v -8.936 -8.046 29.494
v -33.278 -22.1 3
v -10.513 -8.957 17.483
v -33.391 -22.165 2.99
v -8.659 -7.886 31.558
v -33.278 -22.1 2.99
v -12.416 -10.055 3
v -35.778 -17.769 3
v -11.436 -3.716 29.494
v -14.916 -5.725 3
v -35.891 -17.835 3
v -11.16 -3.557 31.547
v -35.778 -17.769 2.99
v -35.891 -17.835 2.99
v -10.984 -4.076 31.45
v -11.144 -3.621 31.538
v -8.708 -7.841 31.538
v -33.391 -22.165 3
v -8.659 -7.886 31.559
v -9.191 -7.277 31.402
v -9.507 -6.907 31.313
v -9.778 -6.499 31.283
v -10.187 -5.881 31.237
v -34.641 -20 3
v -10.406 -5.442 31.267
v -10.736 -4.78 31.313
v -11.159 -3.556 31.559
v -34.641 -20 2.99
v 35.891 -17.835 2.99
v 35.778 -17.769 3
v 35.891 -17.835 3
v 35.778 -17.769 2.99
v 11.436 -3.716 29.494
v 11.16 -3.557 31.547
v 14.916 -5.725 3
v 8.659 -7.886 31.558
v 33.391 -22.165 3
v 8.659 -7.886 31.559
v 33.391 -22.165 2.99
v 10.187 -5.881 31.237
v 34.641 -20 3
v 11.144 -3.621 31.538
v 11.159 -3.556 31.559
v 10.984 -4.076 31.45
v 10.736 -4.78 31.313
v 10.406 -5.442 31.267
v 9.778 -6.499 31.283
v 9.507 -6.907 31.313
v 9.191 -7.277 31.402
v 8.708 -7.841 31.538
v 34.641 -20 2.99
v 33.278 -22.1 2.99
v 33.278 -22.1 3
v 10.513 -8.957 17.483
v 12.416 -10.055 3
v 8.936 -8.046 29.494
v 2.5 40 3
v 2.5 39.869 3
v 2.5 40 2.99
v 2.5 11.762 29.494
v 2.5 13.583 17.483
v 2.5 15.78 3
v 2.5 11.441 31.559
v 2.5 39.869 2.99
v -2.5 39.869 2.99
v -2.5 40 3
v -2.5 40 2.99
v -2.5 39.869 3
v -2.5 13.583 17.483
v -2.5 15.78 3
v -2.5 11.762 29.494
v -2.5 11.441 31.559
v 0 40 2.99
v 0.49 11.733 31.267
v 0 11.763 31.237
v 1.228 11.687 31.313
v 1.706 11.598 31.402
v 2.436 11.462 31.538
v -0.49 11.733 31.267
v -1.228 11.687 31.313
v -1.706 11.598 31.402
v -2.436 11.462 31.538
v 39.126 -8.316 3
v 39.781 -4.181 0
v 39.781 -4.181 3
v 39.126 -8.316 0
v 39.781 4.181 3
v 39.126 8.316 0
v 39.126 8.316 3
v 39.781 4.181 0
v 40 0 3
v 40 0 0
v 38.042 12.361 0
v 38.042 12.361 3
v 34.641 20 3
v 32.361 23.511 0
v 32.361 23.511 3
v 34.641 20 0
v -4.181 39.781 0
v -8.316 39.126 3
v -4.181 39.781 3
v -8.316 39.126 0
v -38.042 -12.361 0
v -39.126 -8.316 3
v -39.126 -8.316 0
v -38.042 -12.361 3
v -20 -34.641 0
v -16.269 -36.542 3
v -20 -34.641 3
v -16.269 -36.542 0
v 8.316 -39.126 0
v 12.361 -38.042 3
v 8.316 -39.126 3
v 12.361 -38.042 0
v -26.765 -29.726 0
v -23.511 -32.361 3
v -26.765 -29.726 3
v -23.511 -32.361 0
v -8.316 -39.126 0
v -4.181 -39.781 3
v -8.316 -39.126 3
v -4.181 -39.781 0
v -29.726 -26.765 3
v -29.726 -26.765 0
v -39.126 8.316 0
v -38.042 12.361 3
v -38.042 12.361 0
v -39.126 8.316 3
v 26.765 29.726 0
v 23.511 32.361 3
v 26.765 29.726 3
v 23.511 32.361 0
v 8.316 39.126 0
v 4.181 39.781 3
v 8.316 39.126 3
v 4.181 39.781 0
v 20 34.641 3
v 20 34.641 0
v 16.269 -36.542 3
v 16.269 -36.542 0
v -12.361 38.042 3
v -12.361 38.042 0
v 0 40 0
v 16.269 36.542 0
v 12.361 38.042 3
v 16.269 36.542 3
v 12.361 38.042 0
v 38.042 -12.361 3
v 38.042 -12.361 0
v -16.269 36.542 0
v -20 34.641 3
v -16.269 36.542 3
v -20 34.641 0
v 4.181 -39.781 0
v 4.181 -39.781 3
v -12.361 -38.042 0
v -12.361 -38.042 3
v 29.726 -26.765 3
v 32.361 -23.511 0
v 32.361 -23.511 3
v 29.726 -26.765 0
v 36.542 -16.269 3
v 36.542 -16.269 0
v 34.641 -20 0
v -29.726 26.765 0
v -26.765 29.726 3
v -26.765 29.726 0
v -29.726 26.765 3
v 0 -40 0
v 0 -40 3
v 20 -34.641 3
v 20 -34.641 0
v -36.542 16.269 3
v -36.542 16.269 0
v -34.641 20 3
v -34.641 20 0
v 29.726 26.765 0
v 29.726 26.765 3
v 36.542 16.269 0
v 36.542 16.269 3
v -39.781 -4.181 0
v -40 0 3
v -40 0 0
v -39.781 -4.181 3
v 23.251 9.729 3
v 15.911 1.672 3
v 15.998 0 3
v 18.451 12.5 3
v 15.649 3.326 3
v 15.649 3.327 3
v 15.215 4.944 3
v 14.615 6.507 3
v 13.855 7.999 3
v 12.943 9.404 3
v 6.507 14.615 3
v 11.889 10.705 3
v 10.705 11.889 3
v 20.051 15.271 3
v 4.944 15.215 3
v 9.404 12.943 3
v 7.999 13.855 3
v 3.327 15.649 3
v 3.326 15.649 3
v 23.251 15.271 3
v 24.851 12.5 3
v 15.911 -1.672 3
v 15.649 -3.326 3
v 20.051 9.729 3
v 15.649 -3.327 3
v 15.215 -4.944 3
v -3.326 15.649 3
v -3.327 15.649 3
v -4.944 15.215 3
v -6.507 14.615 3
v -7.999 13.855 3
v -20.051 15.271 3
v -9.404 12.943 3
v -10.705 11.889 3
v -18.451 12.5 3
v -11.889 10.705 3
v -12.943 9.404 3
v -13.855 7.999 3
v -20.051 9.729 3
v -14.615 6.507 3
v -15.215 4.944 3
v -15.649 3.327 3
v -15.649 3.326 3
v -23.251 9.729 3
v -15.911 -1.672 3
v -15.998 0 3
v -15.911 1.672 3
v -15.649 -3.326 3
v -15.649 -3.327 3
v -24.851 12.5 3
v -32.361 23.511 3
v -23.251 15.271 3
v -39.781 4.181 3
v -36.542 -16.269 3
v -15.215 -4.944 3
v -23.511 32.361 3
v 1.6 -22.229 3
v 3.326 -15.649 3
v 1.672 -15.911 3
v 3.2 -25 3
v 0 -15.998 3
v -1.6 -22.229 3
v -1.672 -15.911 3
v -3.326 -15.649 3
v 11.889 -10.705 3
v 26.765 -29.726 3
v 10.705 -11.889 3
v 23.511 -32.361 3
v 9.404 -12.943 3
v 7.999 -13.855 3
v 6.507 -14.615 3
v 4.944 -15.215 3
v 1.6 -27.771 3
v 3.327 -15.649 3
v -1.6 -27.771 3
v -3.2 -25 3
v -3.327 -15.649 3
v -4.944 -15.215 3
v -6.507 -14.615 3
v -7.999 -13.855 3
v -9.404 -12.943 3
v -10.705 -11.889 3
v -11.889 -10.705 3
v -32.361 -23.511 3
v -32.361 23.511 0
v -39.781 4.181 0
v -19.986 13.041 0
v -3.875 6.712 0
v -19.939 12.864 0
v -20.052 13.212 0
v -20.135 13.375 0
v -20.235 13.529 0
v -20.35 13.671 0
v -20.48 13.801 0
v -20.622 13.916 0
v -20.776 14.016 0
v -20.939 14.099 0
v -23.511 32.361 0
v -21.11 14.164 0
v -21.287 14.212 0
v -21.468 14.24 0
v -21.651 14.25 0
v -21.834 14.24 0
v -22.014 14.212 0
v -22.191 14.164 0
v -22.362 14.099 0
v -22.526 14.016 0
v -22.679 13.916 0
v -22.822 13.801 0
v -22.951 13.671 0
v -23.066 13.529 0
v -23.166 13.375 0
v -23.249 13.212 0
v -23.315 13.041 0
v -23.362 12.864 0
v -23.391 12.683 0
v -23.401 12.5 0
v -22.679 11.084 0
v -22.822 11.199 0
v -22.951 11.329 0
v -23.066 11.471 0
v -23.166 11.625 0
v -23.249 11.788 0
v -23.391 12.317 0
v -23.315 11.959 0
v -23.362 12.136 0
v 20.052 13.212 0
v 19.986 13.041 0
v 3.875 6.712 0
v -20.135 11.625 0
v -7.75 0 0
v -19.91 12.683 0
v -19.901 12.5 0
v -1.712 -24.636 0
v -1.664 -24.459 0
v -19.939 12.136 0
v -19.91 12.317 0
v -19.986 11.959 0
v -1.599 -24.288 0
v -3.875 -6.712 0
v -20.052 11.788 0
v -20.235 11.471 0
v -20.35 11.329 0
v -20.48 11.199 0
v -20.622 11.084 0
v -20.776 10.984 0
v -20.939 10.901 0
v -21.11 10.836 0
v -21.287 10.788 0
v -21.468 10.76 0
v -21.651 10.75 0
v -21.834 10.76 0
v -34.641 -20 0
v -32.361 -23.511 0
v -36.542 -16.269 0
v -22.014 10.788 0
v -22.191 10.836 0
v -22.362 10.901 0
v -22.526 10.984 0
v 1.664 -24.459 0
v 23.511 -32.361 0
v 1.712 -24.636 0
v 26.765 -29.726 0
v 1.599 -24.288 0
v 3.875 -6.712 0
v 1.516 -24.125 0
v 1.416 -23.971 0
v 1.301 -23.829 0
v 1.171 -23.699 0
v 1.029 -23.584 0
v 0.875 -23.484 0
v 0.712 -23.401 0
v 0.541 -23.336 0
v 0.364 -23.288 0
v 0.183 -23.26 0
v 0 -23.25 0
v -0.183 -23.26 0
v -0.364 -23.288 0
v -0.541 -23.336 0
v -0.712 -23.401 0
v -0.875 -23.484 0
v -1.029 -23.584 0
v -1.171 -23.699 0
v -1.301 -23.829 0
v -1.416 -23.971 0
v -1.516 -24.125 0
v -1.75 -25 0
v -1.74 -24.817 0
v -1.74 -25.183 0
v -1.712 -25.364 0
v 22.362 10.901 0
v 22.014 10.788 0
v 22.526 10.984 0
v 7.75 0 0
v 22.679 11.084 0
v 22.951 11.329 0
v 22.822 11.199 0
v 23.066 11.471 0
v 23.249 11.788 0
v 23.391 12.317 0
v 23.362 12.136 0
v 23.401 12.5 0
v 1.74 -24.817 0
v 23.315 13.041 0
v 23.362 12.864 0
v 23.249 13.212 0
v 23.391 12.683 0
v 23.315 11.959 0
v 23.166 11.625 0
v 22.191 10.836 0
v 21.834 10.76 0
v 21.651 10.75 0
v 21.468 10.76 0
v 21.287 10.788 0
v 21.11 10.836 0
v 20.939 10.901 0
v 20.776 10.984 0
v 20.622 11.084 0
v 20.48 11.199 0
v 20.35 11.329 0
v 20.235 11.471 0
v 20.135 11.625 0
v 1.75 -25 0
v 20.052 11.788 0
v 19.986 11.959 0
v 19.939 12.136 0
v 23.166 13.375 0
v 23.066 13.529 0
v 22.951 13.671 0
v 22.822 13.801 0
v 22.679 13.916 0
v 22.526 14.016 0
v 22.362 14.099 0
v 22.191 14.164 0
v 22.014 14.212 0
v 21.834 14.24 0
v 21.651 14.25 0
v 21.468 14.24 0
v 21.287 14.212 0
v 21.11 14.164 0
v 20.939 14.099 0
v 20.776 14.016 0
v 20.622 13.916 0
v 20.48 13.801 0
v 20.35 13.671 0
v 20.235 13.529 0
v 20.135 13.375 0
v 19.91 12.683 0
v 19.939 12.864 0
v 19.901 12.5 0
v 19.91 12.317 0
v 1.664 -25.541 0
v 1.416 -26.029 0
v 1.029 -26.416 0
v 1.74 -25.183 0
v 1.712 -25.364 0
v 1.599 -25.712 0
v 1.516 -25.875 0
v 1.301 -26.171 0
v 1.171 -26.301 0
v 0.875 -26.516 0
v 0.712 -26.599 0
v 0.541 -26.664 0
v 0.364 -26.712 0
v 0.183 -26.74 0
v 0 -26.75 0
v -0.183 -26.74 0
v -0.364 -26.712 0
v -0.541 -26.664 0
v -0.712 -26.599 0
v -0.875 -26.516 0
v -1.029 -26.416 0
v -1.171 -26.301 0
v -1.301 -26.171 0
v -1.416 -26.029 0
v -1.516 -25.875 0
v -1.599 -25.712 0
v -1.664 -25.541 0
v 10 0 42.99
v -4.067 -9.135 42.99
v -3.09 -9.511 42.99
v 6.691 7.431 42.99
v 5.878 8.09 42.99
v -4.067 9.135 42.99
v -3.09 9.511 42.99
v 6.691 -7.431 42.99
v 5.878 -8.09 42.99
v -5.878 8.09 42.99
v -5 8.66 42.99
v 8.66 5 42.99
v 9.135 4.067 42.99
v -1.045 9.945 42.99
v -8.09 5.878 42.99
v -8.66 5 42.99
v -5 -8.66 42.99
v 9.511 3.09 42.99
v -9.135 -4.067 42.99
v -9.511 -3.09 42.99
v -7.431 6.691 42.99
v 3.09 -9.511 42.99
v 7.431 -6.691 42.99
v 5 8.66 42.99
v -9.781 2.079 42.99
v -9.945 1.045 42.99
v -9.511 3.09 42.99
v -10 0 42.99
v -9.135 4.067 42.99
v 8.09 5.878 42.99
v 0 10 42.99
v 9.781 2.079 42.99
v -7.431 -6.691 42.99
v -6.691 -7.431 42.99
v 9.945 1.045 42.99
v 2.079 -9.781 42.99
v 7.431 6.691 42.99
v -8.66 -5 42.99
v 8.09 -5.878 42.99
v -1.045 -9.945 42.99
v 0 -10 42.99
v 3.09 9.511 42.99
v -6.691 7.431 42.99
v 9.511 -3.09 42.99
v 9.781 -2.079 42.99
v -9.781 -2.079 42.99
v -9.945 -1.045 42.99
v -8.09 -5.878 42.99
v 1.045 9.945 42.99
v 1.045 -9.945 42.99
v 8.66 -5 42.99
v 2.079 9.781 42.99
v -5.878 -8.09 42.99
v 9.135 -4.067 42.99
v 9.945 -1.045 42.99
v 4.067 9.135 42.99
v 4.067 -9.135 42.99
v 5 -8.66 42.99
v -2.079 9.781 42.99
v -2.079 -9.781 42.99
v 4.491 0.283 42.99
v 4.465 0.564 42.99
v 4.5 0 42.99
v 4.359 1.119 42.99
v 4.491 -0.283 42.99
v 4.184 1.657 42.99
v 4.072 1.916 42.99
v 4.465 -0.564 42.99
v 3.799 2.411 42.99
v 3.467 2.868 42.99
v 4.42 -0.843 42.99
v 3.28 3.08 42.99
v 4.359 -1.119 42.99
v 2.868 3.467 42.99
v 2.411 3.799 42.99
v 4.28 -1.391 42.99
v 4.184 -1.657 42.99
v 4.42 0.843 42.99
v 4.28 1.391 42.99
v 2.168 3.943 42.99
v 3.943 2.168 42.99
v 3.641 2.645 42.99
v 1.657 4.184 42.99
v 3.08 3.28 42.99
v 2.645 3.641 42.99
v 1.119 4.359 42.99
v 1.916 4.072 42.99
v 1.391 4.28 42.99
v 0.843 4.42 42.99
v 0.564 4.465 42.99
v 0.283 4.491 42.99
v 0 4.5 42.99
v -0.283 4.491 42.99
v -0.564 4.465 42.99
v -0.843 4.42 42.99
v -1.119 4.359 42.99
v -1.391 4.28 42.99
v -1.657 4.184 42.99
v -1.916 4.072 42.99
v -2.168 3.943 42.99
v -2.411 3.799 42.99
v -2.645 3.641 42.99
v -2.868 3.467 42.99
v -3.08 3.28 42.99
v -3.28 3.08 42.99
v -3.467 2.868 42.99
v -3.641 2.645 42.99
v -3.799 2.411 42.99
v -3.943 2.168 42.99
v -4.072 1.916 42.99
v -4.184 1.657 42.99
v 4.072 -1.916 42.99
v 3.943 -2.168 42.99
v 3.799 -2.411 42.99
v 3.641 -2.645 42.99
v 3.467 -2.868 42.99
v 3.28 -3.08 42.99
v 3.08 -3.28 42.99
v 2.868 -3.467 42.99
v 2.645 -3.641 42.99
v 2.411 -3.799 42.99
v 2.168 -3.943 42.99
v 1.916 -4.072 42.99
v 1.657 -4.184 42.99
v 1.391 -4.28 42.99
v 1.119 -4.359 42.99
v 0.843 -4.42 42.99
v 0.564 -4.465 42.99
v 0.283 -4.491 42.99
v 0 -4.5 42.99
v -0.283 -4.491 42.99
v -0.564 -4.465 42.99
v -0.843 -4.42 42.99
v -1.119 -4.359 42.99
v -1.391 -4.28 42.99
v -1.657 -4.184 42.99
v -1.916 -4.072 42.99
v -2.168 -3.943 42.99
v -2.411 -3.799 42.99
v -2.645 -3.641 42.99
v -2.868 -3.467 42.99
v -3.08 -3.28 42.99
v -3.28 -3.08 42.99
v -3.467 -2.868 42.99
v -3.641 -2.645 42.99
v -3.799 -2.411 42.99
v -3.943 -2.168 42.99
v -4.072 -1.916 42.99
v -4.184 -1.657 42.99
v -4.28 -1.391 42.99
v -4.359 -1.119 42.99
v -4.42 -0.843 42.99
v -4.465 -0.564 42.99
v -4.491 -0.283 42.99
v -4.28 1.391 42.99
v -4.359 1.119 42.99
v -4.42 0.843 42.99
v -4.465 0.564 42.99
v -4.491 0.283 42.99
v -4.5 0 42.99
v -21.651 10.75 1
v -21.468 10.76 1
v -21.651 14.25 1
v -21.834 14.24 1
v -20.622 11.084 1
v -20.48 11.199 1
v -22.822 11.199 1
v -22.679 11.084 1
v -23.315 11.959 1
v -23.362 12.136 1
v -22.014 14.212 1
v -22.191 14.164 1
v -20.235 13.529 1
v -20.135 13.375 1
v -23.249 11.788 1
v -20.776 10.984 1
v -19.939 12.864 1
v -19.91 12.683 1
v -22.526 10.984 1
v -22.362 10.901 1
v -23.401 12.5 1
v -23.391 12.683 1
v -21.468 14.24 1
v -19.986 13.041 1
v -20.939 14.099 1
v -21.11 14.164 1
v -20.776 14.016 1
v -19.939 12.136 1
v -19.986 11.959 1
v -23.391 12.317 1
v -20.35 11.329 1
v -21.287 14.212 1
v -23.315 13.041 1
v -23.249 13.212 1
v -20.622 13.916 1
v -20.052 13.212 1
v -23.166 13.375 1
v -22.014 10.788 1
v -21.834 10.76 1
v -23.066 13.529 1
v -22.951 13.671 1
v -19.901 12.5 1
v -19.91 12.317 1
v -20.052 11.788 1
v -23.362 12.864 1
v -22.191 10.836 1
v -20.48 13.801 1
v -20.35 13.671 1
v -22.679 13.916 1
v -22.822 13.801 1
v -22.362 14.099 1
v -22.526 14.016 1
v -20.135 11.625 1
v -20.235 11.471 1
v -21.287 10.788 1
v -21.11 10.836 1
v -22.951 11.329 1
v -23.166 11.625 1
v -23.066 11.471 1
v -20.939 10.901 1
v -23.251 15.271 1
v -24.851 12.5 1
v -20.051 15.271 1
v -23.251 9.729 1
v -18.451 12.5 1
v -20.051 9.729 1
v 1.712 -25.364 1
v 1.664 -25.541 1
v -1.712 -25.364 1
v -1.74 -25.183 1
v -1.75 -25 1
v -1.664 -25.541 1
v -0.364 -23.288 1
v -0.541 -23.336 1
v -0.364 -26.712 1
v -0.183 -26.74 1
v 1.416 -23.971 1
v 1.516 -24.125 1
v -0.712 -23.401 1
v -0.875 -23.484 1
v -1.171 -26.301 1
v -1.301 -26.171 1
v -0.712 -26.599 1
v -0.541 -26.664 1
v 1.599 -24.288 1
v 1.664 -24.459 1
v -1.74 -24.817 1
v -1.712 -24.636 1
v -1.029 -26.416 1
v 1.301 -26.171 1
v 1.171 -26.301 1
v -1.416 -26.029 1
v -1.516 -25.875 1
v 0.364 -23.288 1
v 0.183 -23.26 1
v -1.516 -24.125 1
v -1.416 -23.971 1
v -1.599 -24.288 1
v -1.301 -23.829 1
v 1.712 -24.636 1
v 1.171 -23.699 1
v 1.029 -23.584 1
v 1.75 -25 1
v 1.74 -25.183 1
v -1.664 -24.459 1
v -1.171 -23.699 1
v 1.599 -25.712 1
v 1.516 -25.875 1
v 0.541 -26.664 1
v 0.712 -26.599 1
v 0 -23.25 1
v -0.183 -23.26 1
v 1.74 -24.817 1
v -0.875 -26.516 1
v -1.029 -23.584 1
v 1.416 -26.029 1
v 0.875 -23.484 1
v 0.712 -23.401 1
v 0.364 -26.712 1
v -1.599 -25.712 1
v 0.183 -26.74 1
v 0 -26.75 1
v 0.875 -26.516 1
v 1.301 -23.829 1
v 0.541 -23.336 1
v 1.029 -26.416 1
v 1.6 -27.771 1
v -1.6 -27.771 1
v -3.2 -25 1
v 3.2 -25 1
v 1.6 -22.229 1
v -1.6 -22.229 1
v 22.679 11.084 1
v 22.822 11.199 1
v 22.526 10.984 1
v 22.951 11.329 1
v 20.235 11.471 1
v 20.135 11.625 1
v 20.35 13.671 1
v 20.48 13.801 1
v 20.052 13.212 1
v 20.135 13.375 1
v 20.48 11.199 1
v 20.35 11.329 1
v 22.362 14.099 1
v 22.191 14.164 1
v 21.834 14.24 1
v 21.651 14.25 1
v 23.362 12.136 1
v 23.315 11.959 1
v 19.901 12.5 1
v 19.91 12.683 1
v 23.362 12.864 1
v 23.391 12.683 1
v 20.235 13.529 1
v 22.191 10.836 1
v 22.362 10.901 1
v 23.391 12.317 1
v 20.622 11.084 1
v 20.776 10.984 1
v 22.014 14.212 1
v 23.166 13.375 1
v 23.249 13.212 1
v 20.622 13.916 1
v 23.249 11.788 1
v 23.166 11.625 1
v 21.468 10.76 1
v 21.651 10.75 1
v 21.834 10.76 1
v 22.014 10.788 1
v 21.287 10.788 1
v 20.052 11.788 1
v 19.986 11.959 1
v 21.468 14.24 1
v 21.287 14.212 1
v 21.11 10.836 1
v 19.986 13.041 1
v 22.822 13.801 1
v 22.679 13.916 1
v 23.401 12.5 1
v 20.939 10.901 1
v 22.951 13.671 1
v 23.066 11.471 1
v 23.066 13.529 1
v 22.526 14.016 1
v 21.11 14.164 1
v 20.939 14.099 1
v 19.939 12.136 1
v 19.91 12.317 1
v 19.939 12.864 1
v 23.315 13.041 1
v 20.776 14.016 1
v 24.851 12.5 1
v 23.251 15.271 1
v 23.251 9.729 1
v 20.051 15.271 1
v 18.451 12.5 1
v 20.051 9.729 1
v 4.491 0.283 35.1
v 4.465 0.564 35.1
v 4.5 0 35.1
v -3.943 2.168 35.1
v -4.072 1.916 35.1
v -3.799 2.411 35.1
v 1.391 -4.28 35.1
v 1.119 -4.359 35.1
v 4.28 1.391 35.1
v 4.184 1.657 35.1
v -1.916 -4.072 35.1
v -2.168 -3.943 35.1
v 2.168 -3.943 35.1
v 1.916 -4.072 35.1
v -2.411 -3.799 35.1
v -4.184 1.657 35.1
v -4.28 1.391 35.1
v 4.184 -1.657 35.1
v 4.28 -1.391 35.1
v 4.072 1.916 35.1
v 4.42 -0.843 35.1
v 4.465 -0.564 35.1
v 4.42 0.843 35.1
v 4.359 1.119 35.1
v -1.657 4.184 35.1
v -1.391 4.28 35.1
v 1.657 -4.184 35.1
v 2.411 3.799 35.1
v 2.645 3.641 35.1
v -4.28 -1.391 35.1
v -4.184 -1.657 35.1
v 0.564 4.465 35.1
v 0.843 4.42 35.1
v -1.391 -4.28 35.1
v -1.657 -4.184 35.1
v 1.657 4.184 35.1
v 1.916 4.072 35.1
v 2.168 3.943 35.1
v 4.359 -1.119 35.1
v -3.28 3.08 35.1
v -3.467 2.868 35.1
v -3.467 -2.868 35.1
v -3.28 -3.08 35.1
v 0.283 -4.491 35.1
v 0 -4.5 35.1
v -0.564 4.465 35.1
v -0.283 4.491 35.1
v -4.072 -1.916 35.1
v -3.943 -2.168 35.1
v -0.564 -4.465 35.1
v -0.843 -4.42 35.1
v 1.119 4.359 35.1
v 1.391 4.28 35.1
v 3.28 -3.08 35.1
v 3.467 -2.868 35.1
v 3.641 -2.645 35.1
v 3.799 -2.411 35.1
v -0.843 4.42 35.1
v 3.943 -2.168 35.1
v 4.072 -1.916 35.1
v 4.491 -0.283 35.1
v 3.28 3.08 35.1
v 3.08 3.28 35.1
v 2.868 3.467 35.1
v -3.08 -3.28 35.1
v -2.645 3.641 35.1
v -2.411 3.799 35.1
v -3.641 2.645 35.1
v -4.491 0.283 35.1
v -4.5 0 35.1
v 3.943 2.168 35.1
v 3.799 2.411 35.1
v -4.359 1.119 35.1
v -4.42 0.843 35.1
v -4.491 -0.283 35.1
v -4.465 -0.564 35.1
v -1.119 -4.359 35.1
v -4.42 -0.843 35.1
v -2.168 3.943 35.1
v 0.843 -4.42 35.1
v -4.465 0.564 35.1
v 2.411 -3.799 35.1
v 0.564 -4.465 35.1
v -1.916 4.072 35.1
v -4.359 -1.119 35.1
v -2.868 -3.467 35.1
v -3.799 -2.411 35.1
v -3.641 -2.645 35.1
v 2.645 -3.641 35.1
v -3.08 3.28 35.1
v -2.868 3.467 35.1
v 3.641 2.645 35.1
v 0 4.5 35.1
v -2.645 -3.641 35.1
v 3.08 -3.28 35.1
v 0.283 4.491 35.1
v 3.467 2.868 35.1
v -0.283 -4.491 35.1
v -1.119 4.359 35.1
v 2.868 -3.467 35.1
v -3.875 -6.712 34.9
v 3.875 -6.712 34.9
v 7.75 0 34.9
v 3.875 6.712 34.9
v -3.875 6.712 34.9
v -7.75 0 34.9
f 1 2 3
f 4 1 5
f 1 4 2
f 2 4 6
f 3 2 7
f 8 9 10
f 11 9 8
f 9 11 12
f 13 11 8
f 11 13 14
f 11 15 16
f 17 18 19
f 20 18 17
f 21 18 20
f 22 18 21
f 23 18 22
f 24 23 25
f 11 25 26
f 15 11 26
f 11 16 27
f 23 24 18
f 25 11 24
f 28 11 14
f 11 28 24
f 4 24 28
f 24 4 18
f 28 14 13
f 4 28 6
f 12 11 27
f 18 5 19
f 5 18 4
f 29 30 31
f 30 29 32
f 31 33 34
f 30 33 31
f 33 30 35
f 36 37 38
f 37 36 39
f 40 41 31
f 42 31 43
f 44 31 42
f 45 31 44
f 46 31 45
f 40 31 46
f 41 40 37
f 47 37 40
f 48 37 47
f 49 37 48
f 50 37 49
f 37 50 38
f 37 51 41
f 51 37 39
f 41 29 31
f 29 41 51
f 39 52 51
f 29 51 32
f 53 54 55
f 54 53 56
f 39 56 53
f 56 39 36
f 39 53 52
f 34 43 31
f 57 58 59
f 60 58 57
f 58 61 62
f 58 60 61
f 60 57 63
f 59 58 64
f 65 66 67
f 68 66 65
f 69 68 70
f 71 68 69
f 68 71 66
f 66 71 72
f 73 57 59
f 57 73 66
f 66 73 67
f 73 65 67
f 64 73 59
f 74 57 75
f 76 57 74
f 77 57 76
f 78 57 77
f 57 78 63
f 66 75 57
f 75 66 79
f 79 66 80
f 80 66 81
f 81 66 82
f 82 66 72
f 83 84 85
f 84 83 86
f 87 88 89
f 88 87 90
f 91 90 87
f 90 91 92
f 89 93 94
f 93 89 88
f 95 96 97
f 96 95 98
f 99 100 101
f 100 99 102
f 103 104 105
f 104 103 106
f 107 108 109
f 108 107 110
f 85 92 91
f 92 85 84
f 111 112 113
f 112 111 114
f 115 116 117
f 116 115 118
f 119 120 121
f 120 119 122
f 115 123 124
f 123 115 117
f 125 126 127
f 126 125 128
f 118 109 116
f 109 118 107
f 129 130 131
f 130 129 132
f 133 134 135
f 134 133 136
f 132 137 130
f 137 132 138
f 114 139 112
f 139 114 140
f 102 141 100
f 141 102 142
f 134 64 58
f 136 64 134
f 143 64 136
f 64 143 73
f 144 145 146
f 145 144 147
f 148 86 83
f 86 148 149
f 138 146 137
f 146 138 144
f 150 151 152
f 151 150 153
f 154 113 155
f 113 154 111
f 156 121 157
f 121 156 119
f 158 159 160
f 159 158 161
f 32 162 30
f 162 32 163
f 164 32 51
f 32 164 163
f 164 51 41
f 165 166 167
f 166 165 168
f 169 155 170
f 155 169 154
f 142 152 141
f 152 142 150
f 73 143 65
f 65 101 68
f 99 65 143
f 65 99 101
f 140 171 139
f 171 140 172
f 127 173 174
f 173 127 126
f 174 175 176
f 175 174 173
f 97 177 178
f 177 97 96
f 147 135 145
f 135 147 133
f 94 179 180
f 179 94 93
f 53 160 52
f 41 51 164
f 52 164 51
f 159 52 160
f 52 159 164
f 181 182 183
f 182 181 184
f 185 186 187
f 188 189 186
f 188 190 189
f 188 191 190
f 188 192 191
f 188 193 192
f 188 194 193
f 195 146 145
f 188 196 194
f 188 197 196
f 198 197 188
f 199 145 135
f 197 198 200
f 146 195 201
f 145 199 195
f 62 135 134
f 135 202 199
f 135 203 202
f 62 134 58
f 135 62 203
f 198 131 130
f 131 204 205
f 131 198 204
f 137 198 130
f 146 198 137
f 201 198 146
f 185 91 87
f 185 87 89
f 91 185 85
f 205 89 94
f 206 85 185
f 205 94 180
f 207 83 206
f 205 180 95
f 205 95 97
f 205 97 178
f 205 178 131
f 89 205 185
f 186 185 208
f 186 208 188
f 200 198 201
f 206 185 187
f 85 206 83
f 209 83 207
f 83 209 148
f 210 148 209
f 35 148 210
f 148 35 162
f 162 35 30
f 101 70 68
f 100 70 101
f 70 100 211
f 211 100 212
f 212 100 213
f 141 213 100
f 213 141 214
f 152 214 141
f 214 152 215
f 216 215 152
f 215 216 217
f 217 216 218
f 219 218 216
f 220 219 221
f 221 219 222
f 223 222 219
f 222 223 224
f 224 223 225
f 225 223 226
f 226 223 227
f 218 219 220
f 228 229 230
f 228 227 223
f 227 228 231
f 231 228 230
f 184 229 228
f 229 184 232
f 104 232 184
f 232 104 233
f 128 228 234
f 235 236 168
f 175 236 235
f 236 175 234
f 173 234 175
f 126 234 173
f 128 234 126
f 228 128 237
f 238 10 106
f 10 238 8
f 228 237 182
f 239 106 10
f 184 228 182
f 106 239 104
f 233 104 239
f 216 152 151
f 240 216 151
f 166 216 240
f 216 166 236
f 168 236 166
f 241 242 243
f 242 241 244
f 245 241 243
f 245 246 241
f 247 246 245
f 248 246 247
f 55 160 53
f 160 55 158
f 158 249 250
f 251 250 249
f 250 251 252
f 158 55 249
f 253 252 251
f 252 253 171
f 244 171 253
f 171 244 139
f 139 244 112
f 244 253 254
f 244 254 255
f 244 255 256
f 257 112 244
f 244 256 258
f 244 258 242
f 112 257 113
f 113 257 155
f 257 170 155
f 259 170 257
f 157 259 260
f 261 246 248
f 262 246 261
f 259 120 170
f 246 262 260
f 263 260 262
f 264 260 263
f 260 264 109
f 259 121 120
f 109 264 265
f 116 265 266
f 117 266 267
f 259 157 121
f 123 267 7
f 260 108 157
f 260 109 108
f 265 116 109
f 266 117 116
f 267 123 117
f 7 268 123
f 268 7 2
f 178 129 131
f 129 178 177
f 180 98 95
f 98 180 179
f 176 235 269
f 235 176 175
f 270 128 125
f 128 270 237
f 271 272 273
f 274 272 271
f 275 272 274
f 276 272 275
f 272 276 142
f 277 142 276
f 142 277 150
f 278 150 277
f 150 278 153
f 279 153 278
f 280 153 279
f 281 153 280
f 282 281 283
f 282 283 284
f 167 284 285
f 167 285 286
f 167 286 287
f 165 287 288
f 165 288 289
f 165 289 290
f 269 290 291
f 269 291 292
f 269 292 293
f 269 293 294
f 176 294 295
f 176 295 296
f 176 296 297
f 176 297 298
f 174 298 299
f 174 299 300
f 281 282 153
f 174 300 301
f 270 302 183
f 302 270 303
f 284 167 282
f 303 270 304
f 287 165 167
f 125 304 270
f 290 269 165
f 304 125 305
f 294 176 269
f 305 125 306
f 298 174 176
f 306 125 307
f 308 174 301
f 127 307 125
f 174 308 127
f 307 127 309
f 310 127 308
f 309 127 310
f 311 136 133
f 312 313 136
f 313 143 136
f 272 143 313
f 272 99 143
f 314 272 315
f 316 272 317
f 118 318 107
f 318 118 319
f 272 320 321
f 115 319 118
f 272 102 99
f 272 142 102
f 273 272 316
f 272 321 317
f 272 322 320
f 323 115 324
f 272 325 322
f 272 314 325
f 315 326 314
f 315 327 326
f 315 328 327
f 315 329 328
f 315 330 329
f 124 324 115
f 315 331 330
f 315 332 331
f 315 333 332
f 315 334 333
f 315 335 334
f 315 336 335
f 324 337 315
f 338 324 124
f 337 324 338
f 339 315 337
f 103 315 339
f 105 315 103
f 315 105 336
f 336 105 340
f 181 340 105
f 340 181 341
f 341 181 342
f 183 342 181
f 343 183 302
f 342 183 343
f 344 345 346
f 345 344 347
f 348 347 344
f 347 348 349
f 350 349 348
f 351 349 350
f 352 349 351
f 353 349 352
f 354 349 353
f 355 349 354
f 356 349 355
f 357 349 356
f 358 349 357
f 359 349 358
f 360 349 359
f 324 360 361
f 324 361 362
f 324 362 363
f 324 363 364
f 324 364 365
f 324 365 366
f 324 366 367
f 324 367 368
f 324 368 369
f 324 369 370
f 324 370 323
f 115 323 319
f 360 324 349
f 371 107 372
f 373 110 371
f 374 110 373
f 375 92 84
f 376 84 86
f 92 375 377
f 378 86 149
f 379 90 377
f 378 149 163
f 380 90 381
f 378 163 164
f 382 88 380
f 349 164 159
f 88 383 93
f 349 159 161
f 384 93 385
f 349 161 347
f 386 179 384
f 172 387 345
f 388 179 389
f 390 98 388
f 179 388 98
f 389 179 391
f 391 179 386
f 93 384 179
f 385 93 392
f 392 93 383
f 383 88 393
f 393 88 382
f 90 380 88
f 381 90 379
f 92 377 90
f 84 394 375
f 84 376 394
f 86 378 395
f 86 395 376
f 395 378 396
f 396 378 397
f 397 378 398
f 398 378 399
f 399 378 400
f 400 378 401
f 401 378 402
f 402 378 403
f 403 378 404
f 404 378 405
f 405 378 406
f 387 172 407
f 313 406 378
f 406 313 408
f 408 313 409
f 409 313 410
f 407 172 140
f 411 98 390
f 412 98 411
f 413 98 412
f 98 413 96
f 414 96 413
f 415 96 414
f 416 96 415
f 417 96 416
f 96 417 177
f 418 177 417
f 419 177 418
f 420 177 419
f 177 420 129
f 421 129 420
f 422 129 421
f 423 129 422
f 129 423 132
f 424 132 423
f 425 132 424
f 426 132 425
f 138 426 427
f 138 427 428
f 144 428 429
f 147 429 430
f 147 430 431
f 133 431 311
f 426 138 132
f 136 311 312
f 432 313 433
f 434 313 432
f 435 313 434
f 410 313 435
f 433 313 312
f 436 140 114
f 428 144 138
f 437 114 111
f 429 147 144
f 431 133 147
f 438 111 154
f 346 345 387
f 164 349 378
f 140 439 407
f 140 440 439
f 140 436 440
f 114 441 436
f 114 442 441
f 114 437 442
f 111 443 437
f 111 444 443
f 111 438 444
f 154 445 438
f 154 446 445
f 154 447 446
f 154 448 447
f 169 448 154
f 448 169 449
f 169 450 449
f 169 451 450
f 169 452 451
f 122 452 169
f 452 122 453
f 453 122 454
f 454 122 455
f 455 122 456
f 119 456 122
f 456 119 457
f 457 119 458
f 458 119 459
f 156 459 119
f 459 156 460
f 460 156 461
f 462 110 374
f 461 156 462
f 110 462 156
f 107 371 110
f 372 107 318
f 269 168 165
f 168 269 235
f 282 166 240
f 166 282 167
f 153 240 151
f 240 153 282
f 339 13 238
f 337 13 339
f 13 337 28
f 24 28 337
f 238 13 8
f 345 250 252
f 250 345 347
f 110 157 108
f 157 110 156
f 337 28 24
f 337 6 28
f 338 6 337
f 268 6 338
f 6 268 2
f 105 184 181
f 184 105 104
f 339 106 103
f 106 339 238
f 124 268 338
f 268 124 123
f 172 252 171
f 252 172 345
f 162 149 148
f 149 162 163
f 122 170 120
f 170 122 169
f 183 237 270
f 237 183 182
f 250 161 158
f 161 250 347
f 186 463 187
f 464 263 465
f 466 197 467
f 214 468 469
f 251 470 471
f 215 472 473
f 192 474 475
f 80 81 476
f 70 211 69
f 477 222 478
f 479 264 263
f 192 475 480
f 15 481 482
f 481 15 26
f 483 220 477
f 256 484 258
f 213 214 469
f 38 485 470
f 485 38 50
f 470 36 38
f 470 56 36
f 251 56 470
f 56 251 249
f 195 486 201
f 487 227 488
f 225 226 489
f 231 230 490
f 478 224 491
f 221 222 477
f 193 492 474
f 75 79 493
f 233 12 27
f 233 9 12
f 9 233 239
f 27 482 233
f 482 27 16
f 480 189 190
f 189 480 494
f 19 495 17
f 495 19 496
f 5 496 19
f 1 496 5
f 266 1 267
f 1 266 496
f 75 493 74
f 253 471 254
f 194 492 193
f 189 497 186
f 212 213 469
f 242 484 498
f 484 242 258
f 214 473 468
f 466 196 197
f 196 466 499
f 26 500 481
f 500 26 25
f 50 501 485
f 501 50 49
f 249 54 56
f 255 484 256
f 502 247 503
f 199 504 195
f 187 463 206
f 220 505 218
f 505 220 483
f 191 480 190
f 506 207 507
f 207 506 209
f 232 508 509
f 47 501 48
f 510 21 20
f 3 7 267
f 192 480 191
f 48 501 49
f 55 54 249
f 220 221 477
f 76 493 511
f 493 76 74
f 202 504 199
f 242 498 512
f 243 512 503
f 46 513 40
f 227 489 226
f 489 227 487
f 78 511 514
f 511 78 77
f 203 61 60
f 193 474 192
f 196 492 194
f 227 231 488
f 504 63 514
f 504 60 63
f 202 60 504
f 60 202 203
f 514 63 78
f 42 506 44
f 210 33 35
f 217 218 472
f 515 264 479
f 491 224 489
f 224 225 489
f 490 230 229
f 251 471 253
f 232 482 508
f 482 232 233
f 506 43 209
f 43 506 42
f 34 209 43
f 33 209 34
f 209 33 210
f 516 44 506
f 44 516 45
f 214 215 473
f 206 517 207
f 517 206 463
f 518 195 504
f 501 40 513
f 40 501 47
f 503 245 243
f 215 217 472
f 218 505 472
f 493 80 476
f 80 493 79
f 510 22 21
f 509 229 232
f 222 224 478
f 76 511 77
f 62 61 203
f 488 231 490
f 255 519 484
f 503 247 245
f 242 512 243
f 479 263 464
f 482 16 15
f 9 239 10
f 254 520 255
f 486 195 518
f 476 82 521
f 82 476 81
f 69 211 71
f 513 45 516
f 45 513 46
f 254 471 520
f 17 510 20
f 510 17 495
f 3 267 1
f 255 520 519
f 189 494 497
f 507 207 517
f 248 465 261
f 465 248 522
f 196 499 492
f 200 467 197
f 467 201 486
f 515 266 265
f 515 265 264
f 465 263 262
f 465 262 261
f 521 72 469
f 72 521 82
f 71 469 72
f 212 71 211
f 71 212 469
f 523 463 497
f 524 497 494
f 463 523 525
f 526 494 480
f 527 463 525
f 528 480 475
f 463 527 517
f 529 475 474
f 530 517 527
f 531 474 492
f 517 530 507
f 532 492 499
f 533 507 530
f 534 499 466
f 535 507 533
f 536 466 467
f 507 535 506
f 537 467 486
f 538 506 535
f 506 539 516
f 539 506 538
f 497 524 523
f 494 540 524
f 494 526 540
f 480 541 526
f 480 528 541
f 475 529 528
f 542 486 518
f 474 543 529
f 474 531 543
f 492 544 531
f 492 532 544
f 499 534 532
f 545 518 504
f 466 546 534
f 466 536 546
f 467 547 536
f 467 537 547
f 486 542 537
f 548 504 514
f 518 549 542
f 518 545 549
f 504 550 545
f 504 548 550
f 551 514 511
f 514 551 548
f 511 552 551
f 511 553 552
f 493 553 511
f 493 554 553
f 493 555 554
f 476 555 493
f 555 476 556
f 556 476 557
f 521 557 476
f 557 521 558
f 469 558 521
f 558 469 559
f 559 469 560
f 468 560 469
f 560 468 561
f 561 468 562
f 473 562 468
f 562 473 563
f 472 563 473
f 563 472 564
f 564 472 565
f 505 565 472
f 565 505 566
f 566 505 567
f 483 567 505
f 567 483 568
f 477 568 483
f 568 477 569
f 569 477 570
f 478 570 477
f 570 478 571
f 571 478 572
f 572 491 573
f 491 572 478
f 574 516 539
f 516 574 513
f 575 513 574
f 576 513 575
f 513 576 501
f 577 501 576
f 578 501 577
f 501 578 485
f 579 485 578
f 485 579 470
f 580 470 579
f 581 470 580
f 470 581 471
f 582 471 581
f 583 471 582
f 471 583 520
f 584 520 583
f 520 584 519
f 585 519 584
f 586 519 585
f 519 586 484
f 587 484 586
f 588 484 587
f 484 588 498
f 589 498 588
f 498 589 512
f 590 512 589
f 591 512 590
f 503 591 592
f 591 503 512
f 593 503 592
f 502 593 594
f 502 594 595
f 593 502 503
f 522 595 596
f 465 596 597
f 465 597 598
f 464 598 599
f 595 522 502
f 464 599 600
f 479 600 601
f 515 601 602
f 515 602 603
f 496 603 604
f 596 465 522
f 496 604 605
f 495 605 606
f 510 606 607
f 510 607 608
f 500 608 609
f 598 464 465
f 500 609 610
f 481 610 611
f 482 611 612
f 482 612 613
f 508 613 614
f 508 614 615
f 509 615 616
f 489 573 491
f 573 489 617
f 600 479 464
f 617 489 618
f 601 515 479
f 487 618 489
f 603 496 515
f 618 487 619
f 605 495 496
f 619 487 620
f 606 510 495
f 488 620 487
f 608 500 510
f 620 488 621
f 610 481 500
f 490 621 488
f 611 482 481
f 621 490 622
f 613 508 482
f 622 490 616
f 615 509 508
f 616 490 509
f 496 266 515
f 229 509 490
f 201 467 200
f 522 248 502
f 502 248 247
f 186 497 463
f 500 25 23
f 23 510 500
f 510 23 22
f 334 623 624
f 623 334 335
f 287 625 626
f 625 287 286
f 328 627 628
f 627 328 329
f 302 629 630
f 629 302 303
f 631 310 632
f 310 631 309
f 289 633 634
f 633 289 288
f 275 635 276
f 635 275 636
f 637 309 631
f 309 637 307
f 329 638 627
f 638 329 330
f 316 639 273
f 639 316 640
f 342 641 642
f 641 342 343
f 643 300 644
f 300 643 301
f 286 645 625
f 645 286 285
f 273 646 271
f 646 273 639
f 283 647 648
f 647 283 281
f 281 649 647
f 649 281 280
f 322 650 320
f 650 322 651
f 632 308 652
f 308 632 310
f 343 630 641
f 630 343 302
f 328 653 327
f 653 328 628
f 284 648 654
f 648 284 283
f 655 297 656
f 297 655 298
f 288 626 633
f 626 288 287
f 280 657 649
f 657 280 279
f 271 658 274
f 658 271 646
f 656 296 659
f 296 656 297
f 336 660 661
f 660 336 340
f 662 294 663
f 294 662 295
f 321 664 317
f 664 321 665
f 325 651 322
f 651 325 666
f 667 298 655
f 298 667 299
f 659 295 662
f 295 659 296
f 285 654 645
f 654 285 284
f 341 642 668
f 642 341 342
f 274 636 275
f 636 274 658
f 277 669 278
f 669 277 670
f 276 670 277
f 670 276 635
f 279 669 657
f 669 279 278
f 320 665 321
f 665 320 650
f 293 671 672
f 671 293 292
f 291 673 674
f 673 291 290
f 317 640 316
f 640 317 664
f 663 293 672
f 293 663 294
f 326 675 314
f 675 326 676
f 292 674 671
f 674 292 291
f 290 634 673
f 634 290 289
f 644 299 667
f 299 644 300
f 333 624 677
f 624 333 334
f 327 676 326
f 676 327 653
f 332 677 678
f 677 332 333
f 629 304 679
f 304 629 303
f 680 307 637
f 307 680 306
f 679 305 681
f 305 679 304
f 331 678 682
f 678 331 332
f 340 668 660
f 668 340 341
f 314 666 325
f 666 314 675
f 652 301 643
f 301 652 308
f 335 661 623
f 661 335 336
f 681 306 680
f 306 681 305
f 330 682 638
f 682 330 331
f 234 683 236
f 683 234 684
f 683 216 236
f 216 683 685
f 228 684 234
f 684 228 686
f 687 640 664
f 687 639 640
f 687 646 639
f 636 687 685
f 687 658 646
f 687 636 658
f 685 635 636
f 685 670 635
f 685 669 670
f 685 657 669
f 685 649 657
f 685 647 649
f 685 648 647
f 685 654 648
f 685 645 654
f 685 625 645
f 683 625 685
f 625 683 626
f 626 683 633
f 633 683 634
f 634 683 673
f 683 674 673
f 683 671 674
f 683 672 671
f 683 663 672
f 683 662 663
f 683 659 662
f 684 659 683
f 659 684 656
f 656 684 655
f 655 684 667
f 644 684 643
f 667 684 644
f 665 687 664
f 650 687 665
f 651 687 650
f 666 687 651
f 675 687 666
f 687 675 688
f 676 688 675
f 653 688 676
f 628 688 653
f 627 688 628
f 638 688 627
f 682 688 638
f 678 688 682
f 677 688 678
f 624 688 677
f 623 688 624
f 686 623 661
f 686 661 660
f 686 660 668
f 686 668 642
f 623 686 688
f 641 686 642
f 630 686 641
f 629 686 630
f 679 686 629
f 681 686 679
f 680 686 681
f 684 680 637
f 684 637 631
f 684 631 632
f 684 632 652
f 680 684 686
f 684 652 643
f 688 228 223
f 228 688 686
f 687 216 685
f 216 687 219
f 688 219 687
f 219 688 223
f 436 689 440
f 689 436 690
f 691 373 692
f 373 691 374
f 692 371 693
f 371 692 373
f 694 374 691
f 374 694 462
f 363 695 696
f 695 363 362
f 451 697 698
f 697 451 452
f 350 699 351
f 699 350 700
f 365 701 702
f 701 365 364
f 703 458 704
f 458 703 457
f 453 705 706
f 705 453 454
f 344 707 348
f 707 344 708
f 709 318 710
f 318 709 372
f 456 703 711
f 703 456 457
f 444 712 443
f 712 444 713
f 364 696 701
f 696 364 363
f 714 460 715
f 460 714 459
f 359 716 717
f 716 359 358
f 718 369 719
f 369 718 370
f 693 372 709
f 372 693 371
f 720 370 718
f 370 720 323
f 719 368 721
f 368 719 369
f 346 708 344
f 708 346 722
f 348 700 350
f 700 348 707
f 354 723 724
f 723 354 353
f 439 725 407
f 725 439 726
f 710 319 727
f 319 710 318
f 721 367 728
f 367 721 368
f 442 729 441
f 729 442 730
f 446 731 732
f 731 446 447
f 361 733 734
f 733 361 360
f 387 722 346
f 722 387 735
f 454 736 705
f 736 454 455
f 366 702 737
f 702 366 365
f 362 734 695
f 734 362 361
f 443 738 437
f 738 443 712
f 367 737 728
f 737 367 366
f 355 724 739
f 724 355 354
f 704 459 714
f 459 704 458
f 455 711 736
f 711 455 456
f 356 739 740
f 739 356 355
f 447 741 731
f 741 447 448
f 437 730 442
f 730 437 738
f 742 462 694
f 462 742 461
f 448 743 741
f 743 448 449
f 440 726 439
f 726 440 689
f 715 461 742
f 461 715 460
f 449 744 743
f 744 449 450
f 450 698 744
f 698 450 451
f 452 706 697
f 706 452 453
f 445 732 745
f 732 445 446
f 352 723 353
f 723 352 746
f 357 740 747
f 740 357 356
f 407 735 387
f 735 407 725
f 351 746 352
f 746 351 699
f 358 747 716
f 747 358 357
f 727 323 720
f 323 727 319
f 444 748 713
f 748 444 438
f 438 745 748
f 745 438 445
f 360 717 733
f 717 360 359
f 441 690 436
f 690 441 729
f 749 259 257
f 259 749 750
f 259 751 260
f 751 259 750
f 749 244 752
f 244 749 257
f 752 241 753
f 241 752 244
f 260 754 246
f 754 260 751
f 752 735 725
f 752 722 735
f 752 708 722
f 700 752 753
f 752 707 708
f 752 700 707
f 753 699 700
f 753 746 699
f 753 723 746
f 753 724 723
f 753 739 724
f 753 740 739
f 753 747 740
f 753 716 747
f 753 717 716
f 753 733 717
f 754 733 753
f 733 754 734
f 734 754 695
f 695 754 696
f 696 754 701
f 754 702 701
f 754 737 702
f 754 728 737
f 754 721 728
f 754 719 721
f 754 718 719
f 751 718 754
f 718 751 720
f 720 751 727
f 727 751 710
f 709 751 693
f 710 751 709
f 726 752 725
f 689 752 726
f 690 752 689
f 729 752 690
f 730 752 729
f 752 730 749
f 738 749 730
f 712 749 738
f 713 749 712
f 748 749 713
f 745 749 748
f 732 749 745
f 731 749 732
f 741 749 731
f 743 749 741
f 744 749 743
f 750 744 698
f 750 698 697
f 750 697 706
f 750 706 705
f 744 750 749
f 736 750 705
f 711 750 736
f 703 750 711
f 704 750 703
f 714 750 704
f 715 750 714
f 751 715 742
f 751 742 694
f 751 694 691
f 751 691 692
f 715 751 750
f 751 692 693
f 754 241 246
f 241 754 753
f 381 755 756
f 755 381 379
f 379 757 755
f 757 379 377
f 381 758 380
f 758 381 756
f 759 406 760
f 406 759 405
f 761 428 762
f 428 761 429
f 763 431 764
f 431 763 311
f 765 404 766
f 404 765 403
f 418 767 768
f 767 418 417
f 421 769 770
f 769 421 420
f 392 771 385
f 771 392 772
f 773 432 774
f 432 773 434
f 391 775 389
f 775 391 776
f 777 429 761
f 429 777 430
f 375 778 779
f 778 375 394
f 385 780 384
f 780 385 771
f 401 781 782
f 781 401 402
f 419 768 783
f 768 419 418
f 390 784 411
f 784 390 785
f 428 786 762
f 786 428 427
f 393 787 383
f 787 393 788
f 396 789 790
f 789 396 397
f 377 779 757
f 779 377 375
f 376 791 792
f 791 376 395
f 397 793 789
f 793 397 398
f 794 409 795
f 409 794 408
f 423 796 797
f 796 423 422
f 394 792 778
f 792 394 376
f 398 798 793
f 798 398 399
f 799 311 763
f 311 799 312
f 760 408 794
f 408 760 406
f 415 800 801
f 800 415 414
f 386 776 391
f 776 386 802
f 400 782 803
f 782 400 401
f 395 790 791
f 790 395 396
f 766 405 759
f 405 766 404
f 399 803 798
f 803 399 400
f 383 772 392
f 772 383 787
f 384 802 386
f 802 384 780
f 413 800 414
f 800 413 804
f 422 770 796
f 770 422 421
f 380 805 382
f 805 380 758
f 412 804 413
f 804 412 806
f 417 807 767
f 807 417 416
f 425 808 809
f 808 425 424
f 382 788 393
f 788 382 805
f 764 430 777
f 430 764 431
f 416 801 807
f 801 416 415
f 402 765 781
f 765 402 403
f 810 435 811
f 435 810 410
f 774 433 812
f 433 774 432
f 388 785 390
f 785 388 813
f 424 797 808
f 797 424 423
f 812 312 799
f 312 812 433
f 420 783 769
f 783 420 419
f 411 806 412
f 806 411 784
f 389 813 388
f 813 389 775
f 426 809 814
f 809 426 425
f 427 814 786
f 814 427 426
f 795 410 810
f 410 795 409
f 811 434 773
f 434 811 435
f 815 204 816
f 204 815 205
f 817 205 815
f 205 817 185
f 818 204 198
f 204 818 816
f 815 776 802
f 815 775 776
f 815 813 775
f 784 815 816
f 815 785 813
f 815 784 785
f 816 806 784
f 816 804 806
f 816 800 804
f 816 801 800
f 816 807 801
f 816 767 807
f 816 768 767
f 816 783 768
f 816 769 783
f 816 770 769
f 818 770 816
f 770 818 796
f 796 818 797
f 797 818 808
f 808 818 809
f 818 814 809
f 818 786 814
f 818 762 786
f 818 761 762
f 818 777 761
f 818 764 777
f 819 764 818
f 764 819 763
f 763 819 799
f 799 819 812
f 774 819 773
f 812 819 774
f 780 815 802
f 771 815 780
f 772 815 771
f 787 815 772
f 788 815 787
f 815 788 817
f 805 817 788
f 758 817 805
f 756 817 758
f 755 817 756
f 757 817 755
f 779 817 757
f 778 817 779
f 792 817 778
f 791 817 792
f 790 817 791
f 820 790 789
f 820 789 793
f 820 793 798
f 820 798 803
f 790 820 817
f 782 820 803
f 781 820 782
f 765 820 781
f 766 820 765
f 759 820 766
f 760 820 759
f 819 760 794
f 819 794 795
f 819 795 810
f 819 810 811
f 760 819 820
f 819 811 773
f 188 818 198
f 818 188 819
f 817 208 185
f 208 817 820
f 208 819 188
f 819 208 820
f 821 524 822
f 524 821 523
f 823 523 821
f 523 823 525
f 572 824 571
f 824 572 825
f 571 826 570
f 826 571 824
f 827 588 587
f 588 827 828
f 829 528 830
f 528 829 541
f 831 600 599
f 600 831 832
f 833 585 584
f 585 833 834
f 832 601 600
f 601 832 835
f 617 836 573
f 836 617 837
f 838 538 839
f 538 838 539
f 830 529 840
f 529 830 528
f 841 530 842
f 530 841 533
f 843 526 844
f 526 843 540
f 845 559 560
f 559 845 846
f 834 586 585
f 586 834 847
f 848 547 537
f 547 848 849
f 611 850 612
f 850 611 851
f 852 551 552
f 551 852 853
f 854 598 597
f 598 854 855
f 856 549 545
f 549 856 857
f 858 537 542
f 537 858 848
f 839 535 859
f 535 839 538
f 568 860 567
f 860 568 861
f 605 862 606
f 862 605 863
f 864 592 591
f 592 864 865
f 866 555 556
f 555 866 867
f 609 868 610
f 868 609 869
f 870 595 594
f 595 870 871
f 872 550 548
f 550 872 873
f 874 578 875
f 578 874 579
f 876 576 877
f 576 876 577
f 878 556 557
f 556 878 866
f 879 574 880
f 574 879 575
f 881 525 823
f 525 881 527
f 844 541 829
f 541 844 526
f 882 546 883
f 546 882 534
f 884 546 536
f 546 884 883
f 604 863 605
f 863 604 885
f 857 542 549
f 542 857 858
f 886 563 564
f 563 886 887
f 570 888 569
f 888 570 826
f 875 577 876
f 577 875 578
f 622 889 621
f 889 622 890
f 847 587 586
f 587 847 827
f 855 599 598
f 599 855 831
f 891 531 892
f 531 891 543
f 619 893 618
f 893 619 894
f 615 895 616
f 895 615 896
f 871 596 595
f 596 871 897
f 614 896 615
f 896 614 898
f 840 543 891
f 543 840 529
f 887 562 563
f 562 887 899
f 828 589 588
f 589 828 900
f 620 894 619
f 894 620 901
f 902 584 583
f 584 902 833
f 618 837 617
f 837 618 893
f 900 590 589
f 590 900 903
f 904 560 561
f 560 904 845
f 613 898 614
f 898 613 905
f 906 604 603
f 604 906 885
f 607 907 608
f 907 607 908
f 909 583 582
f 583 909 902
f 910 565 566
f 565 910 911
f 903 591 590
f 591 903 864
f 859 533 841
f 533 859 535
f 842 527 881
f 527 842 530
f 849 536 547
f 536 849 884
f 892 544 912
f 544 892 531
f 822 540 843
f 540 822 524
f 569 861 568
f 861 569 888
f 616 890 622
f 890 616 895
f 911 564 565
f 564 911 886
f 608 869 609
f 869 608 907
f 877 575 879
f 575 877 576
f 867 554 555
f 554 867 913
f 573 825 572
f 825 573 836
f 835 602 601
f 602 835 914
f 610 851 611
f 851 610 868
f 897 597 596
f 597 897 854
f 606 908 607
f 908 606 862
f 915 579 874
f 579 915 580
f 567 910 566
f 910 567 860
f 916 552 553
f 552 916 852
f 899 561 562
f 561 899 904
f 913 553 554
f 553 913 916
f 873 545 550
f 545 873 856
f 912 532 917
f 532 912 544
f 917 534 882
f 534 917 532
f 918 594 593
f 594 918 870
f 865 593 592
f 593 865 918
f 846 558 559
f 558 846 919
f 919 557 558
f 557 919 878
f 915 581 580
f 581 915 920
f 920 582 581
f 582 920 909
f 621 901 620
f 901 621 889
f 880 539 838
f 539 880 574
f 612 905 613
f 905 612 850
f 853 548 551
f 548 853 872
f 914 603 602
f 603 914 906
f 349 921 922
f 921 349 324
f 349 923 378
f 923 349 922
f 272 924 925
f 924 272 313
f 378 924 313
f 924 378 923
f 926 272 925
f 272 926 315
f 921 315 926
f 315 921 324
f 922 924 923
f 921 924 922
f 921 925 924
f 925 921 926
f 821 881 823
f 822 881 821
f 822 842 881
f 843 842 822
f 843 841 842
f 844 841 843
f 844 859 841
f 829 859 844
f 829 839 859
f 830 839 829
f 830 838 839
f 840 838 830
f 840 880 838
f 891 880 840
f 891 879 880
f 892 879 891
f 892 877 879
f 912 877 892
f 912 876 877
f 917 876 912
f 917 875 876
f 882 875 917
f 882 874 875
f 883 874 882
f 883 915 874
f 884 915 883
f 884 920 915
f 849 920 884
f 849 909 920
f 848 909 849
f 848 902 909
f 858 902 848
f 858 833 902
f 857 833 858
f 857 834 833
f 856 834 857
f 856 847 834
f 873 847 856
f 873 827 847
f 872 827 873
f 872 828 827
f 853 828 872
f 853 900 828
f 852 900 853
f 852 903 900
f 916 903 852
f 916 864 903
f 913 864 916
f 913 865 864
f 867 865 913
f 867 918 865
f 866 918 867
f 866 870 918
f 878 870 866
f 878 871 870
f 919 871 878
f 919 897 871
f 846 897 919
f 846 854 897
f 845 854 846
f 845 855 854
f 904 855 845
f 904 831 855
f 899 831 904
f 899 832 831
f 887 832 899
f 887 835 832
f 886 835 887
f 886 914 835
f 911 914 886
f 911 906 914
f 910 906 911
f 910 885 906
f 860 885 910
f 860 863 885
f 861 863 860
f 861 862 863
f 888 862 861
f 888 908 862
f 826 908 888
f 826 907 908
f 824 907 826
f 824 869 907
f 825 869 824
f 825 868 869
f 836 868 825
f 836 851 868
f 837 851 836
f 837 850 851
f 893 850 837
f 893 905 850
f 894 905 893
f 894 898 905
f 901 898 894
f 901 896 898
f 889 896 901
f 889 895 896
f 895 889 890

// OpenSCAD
difference() {
    union() {
        cylinder(r=80/2,h=3,$fn=60);
        translate([0,0,2.99])cylinder(r2=20/2,r1=16,h=40,$fn=60);

        for(i=[120,240,360]) {
            rotate([0,0,i]) {
                translate([-2.5,0,2.99]) {
                    hull() {
                        translate([0,10,0])cube([5,30,0.01]);
                        translate([0,10,0])cube([5,0.01,30]);
                    }
                }
            }
        }
    }


    translate([0,0,3]) {
        cylinder(r=9/2,h=50,$fn=100);
    }
    for(j=[60,180,300]) {
        rotate([0,0,j]) {
            translate([0,25,-1]) {
                #cylinder(r=3.5/2,h=100,$fn=60);
            }
            translate([0,25,1]) {
                #cylinder(r=6.4/2,h=100,$fn=6);
            }
        }
    }
    translate([0,0,-0.1])cylinder(r=15.5/2,h=35,$fn=6);
}
translate([0,0,35-0.1])cylinder(r=16/2,h=0.2,$fn=6);
